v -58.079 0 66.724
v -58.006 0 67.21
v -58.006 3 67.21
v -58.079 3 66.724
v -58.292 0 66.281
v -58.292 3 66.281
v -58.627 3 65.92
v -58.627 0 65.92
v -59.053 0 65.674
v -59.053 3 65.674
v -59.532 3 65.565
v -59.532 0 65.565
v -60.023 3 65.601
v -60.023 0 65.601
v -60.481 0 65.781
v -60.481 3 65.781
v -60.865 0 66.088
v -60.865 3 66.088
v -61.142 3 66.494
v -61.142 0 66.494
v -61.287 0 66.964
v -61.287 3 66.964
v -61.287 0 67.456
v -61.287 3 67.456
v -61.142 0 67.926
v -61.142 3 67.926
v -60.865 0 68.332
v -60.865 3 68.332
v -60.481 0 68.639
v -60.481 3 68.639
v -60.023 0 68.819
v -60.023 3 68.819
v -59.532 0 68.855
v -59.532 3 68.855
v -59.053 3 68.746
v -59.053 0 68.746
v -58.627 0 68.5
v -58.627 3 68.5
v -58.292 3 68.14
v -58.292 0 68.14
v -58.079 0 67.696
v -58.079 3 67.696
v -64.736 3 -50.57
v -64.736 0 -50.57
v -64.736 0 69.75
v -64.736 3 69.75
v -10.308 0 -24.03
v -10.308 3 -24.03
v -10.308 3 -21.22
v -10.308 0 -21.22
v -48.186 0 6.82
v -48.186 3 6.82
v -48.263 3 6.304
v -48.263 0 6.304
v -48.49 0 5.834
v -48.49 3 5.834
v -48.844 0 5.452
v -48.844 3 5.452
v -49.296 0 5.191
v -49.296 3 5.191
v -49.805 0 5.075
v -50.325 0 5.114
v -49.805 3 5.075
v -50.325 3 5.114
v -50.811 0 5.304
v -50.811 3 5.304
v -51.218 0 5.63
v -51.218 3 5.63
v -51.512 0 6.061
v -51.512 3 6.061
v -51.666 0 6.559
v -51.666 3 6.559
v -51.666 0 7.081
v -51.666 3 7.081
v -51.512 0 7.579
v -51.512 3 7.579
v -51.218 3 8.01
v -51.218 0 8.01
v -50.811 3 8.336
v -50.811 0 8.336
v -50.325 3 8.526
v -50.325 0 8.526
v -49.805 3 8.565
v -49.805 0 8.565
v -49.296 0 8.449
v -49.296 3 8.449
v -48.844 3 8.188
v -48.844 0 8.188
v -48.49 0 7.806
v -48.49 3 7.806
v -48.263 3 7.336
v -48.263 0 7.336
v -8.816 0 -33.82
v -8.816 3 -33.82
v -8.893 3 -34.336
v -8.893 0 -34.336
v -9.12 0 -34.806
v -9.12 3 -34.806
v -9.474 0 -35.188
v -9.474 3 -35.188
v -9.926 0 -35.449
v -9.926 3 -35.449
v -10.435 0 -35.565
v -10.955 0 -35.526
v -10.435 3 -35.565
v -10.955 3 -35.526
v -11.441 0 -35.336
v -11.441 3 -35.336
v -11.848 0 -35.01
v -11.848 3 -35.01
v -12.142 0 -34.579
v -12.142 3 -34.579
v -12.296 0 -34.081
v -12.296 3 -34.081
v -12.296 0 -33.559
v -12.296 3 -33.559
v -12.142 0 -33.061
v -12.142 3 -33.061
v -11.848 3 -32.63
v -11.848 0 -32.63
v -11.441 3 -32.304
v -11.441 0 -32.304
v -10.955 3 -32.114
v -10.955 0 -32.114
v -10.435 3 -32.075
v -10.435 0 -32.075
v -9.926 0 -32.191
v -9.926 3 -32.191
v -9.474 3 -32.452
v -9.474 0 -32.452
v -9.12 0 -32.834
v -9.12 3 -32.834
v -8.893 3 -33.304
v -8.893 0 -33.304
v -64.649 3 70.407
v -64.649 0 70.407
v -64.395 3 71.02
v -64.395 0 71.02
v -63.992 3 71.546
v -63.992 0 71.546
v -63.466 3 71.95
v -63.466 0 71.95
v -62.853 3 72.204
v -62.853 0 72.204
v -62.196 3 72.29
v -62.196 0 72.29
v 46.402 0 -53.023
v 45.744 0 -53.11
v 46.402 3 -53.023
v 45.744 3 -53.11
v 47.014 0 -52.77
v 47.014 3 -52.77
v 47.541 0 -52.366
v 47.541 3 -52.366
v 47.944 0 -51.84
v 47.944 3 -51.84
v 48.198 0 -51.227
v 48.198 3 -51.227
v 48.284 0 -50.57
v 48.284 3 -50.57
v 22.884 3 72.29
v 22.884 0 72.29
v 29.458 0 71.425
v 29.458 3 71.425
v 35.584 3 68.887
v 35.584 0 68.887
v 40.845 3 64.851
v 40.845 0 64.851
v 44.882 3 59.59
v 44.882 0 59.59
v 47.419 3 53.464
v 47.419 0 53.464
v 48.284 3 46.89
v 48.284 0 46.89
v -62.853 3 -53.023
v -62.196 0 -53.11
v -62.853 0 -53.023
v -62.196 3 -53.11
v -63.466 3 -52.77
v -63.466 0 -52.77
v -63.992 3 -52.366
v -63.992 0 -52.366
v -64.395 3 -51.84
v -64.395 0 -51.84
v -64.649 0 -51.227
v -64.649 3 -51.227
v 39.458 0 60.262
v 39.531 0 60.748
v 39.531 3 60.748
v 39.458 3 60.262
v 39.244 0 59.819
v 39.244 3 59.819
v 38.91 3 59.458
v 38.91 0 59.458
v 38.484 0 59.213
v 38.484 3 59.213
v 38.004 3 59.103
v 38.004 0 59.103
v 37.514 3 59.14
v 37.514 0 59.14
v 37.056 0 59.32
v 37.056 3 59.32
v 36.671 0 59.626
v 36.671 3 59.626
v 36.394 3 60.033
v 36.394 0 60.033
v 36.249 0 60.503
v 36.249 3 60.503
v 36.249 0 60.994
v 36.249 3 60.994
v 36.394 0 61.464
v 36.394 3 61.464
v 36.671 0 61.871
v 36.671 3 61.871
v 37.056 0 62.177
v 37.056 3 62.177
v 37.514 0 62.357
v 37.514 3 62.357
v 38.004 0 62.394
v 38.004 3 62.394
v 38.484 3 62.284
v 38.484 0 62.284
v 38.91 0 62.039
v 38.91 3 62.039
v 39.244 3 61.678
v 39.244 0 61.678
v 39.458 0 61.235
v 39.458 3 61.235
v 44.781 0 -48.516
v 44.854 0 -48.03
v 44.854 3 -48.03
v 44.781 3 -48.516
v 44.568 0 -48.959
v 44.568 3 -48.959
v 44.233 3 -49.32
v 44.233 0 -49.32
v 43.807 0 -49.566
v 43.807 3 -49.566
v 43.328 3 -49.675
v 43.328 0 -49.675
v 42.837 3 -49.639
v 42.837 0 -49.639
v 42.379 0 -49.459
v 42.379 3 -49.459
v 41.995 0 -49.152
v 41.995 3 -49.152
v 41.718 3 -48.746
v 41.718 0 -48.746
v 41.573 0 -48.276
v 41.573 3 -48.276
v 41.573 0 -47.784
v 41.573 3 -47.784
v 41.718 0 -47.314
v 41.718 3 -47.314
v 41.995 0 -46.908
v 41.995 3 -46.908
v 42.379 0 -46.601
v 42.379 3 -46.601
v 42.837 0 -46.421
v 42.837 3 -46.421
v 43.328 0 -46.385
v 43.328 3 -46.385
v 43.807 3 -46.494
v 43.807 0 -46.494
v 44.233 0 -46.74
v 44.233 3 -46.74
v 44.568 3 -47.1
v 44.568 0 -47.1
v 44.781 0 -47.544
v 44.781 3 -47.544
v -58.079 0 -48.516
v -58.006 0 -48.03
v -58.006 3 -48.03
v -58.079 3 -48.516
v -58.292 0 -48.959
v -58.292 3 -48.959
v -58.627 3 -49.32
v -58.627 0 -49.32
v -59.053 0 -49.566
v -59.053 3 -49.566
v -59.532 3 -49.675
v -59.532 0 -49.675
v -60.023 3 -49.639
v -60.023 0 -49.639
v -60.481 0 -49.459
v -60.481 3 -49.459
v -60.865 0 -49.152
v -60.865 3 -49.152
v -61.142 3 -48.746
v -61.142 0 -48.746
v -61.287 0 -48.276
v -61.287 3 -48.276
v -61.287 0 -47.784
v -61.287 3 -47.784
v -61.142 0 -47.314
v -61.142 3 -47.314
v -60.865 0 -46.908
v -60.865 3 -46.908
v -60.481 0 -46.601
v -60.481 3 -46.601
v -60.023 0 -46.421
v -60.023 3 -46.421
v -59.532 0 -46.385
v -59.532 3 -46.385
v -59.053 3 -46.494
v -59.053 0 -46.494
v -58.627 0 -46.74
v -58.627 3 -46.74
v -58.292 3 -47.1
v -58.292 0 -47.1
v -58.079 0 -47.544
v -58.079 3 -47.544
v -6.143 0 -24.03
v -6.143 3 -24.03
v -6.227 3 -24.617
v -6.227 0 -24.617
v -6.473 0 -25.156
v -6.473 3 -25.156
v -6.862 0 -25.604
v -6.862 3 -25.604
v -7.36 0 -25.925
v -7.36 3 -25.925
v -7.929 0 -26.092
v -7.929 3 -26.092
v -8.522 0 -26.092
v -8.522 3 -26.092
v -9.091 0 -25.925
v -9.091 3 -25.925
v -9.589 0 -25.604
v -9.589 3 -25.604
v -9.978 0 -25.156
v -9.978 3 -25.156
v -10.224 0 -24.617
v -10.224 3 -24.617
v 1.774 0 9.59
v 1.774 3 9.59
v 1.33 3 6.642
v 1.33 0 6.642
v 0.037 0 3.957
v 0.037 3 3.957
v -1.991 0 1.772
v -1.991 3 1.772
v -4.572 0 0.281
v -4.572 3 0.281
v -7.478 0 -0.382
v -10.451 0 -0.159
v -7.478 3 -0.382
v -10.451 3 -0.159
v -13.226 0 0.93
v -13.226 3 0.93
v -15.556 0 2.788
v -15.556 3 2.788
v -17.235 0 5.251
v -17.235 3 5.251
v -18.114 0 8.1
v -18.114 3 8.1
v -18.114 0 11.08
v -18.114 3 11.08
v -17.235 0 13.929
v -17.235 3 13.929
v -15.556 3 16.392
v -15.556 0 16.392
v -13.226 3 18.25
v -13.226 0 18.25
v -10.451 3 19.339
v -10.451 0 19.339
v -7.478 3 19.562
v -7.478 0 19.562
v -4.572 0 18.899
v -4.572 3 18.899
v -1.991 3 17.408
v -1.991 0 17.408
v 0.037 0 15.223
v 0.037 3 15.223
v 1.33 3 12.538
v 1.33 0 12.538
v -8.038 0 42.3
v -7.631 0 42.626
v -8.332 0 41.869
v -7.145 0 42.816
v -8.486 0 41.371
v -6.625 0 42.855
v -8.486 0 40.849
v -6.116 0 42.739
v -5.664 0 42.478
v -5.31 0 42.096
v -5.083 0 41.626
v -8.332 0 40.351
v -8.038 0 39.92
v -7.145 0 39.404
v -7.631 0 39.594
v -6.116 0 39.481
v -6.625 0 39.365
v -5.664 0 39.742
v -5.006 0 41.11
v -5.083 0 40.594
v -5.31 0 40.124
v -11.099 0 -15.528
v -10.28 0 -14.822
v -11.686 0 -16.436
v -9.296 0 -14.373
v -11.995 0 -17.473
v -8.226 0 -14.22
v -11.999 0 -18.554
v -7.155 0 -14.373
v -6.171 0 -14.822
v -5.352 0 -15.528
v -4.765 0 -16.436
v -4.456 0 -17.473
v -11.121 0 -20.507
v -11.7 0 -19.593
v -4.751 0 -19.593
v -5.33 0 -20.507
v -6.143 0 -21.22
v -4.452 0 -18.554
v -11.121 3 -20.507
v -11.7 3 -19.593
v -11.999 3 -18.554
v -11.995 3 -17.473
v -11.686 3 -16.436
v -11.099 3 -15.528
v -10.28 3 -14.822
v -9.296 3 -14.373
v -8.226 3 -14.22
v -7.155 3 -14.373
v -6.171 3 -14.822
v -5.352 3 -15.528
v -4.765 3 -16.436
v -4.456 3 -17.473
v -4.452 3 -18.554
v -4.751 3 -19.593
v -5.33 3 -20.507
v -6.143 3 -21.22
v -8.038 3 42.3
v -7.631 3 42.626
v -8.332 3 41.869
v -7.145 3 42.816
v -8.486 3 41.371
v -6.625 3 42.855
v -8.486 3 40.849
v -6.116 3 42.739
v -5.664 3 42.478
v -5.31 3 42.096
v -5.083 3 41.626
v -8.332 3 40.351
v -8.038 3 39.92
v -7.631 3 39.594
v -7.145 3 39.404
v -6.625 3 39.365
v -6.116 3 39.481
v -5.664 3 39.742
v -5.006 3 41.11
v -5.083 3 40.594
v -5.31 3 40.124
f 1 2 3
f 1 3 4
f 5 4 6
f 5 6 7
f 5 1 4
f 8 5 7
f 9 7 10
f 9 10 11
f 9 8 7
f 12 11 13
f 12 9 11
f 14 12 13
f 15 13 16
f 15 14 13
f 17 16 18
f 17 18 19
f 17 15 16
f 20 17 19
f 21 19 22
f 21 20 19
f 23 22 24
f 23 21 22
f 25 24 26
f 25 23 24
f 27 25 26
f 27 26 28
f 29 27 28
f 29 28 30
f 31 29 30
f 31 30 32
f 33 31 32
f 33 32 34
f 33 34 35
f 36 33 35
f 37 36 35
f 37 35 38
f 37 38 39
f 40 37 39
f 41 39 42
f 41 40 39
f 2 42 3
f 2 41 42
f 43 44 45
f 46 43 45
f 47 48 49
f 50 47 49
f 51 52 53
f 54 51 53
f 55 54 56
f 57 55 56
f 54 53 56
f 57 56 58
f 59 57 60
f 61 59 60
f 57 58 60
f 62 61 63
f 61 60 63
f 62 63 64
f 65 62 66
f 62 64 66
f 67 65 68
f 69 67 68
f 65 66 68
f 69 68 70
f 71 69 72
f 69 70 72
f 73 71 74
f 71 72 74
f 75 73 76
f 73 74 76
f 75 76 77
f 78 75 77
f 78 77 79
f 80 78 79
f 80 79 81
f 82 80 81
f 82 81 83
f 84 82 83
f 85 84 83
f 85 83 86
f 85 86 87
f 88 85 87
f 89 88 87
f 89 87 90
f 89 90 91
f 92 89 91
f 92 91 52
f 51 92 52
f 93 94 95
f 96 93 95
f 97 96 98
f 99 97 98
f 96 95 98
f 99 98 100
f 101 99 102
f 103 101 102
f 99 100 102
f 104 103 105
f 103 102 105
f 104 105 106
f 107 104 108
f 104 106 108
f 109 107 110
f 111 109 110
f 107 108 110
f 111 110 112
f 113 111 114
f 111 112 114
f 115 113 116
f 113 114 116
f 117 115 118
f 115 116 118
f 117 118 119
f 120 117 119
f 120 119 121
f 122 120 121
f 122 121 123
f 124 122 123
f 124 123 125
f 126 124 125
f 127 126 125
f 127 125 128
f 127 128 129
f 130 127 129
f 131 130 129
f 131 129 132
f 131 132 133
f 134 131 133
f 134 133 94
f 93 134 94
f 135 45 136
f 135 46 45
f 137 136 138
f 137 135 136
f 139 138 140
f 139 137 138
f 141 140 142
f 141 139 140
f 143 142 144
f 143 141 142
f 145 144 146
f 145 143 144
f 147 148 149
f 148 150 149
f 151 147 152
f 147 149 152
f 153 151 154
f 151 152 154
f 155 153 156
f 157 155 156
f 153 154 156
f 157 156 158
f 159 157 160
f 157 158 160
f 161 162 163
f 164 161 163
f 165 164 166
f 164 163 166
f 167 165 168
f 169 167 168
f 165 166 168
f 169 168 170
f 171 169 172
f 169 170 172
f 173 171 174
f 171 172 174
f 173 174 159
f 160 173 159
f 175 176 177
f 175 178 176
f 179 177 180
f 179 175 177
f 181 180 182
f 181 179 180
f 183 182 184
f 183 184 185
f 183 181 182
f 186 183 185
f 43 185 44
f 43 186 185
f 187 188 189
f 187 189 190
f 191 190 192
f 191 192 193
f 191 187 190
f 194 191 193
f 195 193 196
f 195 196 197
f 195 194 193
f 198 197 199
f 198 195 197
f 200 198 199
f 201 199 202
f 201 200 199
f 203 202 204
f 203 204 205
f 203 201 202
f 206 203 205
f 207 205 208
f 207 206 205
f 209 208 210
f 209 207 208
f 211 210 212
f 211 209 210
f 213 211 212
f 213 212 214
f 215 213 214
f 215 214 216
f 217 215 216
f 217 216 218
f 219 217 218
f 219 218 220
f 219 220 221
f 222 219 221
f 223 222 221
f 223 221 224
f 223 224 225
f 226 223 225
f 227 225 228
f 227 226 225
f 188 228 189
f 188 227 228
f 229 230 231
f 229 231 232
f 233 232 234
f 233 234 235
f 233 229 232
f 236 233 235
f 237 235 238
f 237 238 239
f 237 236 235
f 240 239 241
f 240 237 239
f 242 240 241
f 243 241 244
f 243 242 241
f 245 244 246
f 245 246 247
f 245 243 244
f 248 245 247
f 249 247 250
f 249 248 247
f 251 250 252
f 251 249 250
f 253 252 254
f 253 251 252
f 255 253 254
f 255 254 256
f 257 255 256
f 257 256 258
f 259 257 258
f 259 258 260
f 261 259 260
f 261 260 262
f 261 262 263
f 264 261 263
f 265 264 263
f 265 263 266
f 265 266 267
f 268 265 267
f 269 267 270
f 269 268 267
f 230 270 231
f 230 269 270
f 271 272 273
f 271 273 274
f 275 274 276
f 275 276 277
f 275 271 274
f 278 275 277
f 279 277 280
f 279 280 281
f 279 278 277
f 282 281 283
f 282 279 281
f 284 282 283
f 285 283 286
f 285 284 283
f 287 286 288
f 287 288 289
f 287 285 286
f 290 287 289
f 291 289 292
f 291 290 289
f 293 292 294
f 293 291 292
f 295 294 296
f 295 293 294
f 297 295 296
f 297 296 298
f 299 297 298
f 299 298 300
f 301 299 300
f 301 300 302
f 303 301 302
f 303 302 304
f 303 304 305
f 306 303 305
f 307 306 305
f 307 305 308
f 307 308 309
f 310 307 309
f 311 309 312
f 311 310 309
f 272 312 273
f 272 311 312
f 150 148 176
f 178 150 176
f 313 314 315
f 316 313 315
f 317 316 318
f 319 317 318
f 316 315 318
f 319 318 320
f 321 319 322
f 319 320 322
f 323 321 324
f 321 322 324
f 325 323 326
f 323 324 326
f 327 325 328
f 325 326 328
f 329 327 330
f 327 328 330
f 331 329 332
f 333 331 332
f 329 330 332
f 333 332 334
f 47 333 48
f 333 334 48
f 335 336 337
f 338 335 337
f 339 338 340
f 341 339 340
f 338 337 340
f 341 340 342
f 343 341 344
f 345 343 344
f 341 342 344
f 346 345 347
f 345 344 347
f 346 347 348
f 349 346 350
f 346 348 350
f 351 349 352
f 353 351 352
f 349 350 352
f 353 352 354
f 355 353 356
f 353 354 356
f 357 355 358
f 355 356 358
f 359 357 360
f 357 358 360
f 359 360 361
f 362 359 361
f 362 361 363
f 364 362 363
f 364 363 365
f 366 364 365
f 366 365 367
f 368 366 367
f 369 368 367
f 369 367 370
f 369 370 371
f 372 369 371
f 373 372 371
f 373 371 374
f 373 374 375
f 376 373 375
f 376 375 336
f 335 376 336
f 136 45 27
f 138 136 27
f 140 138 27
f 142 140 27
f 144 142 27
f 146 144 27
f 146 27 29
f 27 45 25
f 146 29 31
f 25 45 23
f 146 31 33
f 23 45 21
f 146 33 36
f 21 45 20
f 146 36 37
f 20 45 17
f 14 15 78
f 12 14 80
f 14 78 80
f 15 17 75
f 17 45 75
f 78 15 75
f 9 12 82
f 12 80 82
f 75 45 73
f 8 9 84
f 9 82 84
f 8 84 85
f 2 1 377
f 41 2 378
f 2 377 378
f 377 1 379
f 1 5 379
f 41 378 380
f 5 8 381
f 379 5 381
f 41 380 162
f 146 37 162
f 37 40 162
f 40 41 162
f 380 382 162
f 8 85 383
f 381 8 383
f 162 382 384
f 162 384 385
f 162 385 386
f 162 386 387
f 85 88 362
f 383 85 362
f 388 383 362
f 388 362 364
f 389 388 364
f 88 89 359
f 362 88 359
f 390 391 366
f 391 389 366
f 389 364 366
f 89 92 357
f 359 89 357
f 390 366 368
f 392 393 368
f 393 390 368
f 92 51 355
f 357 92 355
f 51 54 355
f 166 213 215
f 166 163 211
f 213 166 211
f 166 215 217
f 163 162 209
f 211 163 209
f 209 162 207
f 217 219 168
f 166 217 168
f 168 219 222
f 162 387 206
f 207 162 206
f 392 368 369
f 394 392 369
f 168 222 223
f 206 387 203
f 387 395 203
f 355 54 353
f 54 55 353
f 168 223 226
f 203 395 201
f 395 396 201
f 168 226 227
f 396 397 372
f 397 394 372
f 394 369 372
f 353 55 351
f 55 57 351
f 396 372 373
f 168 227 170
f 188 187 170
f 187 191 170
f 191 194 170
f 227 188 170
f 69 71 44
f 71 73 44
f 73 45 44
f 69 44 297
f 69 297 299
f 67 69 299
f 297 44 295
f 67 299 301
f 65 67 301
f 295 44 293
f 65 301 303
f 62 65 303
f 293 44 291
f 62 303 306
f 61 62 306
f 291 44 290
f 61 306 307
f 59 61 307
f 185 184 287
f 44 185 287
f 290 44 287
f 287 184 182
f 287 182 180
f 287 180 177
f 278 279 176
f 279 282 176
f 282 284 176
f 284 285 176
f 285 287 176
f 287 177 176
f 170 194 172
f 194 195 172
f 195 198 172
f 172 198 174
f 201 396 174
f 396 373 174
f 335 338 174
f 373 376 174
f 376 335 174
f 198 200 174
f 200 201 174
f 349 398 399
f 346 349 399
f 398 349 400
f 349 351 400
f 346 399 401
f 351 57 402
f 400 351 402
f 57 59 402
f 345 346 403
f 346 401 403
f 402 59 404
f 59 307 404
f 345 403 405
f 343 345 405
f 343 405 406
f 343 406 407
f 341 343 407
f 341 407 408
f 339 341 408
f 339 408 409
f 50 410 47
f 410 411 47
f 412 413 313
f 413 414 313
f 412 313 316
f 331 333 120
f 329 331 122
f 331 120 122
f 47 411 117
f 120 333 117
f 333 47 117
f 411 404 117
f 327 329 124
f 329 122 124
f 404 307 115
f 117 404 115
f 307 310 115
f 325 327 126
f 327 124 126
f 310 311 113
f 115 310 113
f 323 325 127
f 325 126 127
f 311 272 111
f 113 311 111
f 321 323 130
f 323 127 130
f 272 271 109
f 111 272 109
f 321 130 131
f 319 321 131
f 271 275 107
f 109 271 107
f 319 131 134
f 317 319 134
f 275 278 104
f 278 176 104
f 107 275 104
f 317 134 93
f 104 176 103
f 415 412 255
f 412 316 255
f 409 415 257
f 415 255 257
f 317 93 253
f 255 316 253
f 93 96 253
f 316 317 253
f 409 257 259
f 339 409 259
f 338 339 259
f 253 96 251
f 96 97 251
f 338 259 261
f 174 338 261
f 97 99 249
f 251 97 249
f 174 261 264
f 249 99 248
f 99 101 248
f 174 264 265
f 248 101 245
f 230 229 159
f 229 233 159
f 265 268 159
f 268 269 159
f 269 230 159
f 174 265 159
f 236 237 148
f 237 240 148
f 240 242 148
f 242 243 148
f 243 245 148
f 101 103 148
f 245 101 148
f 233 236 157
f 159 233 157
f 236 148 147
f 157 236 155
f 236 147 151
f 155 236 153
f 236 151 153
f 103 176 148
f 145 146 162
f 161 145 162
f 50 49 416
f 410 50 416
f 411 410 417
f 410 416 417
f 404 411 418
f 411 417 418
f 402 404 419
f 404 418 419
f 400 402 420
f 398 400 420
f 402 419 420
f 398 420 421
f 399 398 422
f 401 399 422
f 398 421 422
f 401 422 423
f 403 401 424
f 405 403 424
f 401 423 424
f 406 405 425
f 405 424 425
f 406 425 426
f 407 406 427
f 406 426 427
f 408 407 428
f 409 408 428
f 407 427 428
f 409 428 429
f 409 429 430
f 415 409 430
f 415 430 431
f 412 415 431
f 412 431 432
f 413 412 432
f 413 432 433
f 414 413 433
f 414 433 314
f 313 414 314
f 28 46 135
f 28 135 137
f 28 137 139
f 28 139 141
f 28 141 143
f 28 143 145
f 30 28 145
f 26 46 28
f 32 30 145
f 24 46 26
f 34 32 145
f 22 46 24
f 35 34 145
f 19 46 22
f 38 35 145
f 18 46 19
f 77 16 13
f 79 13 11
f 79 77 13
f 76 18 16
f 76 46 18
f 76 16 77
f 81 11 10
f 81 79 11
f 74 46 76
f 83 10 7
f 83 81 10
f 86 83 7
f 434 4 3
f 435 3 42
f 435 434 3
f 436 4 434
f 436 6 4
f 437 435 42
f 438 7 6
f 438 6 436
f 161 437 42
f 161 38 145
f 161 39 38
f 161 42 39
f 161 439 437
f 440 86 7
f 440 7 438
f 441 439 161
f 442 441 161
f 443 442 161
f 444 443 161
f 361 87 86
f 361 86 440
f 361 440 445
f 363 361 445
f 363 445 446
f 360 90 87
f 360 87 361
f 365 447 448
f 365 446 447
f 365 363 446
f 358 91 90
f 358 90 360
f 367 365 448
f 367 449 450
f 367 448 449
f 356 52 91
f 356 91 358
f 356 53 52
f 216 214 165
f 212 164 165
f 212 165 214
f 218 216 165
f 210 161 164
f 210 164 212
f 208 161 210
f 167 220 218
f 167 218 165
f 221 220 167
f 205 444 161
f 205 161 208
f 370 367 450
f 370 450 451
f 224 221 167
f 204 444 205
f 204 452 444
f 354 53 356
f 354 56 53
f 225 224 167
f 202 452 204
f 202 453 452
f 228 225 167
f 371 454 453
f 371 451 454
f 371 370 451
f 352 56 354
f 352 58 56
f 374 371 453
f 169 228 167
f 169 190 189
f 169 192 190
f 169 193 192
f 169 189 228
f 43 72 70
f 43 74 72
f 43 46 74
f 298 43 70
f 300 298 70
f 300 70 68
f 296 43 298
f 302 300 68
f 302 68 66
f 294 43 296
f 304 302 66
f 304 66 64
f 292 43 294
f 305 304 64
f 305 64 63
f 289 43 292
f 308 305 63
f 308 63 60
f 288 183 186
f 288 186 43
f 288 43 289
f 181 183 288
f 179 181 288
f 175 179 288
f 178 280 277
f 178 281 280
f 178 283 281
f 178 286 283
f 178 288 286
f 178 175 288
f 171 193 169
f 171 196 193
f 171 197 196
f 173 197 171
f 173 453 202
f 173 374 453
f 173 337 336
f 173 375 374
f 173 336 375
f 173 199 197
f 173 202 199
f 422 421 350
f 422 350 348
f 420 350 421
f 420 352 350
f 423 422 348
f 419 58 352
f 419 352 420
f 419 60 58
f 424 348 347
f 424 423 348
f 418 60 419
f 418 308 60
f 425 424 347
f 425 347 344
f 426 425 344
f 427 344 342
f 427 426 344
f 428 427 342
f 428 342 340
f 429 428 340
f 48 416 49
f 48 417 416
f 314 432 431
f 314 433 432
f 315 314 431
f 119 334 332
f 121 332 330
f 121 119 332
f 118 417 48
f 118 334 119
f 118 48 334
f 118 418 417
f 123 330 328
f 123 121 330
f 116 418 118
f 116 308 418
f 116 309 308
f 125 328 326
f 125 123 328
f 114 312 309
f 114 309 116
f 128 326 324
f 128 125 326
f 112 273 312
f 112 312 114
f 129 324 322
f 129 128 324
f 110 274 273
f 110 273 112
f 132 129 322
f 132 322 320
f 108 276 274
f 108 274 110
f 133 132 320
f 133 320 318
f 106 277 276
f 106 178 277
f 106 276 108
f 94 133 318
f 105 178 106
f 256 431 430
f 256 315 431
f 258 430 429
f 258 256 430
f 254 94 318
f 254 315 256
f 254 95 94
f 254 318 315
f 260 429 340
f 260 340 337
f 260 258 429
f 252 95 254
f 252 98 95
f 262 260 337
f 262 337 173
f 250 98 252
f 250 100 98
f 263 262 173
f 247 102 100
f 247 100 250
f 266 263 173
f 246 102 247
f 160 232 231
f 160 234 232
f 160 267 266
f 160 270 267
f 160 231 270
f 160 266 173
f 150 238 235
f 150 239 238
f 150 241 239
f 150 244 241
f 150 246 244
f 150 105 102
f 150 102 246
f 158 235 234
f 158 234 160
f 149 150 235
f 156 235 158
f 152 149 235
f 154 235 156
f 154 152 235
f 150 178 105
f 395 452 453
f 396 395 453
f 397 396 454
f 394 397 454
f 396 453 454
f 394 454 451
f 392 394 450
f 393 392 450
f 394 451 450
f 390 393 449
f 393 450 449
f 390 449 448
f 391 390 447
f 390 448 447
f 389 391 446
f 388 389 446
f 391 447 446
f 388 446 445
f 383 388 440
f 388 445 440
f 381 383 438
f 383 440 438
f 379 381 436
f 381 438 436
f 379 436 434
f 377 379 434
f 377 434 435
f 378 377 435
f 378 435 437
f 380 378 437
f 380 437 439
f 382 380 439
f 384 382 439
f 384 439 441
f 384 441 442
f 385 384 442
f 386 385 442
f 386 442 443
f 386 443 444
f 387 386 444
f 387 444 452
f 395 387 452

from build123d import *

# Parameters (mm, degrees)
SKETCH1_R           = 1.65
BOSS_EXTRUDE3_DEPTH = 3
CUT_EXTRUDE1_DEPTH  = 4
SKETCH4_R           = 1.75
CUT_EXTRUDE2_DEPTH  = 4
SKETCH5_R           = 10
CUT_EXTRUDE3_DEPTH  = 4
FILLET1_R           = 2.54


with BuildPart() as part:
    # Sketch1 → Boss-Extrude3 (new body)
    with BuildSketch(Plane(origin=(0, 0, 0), x_dir=(1, 0, 0), z_dir=(0, 1, 0))):
        with BuildLine():
            Line((48.284490735, 53.109977813), (-64.735509285, 53.109977813))
            Line((-64.735509285, 53.109977813), (-64.735509285, -72.290076187))
            Line((-64.735509285, -72.290076187), (22.884490735, -72.290076187))
            ThreePointArc((22.884490735, -72.290076187), (40.845002977, -64.850588429), (48.284490735, -46.890076187))
            Line((48.284490735, -46.890076187), (48.284490735, 53.109977813))
        make_face()
        with Locations((-59.655509285, 48.029977813)):
            Circle(SKETCH1_R, mode=Mode.SUBTRACT)
        with Locations((43.204490735, 48.029977813)):
            Circle(SKETCH1_R, mode=Mode.SUBTRACT)
        with Locations((-59.655509285, -67.210076187)):
            Circle(SKETCH1_R, mode=Mode.SUBTRACT)
        with Locations((37.880892571, -60.748479124)):
            Circle(SKETCH1_R, mode=Mode.SUBTRACT)
    extrude(amount=BOSS_EXTRUDE3_DEPTH)

    # Sketch3 → Cut-Extrude1 (cut, through all)
    with BuildSketch(Plane(origin=(0, 3, 0), x_dir=(1, 0, 0), z_dir=(0, 1, 0))):
        with BuildLine():
            Line((-10.308309275, 24.029977813), (-10.308309275, 21.220282526))
            ThreePointArc((-10.308309275, 21.220282526), (-8.225509275, 14.219977813), (-6.142709275, 21.220282526))
            Line((-6.142709275, 21.220282526), (-6.142709275, 24.029977813))
            ThreePointArc((-6.142709275, 24.029977813), (-8.225509275, 26.112777813), (-10.308309275, 24.029977813))
        make_face()
    extrude(amount=-CUT_EXTRUDE1_DEPTH, mode=Mode.SUBTRACT)

    # Sketch4 → Cut-Extrude2 (cut, through all)
    with BuildSketch(Plane(origin=(0, 3, 0), x_dir=(1, 0, 0), z_dir=(0, 1, 0))):
        with Locations((-49.935509285, -6.820022187)):
            Circle(SKETCH4_R)
        with Locations((-6.755509285, -41.110022187)):
            Circle(SKETCH4_R)
        with Locations((-10.565509285, 33.819977813)):
            Circle(SKETCH4_R)
    extrude(amount=-CUT_EXTRUDE2_DEPTH, mode=Mode.SUBTRACT)

    # Sketch5 → Cut-Extrude3 (cut, through all)
    with BuildSketch(Plane(origin=(0, 3, 0), x_dir=(1, 0, 0), z_dir=(0, 1, 0))):
        with Locations((-8.225509275, -9.590049187)):
            Circle(SKETCH5_R)
    extrude(amount=-CUT_EXTRUDE3_DEPTH, mode=Mode.SUBTRACT)

    # Fillet1
    fillet1_edges = [part.edges().sort_by_distance(p)[0] for p in [
        (-64.735509285, 1.5, 72.290076187),
        (-64.735509285, 1.5, -53.109977813),
        (48.284490735, 1.5, -53.109977813),
    ]]
    fillet(fillet1_edges, radius=FILLET1_R)


solid = part.part
